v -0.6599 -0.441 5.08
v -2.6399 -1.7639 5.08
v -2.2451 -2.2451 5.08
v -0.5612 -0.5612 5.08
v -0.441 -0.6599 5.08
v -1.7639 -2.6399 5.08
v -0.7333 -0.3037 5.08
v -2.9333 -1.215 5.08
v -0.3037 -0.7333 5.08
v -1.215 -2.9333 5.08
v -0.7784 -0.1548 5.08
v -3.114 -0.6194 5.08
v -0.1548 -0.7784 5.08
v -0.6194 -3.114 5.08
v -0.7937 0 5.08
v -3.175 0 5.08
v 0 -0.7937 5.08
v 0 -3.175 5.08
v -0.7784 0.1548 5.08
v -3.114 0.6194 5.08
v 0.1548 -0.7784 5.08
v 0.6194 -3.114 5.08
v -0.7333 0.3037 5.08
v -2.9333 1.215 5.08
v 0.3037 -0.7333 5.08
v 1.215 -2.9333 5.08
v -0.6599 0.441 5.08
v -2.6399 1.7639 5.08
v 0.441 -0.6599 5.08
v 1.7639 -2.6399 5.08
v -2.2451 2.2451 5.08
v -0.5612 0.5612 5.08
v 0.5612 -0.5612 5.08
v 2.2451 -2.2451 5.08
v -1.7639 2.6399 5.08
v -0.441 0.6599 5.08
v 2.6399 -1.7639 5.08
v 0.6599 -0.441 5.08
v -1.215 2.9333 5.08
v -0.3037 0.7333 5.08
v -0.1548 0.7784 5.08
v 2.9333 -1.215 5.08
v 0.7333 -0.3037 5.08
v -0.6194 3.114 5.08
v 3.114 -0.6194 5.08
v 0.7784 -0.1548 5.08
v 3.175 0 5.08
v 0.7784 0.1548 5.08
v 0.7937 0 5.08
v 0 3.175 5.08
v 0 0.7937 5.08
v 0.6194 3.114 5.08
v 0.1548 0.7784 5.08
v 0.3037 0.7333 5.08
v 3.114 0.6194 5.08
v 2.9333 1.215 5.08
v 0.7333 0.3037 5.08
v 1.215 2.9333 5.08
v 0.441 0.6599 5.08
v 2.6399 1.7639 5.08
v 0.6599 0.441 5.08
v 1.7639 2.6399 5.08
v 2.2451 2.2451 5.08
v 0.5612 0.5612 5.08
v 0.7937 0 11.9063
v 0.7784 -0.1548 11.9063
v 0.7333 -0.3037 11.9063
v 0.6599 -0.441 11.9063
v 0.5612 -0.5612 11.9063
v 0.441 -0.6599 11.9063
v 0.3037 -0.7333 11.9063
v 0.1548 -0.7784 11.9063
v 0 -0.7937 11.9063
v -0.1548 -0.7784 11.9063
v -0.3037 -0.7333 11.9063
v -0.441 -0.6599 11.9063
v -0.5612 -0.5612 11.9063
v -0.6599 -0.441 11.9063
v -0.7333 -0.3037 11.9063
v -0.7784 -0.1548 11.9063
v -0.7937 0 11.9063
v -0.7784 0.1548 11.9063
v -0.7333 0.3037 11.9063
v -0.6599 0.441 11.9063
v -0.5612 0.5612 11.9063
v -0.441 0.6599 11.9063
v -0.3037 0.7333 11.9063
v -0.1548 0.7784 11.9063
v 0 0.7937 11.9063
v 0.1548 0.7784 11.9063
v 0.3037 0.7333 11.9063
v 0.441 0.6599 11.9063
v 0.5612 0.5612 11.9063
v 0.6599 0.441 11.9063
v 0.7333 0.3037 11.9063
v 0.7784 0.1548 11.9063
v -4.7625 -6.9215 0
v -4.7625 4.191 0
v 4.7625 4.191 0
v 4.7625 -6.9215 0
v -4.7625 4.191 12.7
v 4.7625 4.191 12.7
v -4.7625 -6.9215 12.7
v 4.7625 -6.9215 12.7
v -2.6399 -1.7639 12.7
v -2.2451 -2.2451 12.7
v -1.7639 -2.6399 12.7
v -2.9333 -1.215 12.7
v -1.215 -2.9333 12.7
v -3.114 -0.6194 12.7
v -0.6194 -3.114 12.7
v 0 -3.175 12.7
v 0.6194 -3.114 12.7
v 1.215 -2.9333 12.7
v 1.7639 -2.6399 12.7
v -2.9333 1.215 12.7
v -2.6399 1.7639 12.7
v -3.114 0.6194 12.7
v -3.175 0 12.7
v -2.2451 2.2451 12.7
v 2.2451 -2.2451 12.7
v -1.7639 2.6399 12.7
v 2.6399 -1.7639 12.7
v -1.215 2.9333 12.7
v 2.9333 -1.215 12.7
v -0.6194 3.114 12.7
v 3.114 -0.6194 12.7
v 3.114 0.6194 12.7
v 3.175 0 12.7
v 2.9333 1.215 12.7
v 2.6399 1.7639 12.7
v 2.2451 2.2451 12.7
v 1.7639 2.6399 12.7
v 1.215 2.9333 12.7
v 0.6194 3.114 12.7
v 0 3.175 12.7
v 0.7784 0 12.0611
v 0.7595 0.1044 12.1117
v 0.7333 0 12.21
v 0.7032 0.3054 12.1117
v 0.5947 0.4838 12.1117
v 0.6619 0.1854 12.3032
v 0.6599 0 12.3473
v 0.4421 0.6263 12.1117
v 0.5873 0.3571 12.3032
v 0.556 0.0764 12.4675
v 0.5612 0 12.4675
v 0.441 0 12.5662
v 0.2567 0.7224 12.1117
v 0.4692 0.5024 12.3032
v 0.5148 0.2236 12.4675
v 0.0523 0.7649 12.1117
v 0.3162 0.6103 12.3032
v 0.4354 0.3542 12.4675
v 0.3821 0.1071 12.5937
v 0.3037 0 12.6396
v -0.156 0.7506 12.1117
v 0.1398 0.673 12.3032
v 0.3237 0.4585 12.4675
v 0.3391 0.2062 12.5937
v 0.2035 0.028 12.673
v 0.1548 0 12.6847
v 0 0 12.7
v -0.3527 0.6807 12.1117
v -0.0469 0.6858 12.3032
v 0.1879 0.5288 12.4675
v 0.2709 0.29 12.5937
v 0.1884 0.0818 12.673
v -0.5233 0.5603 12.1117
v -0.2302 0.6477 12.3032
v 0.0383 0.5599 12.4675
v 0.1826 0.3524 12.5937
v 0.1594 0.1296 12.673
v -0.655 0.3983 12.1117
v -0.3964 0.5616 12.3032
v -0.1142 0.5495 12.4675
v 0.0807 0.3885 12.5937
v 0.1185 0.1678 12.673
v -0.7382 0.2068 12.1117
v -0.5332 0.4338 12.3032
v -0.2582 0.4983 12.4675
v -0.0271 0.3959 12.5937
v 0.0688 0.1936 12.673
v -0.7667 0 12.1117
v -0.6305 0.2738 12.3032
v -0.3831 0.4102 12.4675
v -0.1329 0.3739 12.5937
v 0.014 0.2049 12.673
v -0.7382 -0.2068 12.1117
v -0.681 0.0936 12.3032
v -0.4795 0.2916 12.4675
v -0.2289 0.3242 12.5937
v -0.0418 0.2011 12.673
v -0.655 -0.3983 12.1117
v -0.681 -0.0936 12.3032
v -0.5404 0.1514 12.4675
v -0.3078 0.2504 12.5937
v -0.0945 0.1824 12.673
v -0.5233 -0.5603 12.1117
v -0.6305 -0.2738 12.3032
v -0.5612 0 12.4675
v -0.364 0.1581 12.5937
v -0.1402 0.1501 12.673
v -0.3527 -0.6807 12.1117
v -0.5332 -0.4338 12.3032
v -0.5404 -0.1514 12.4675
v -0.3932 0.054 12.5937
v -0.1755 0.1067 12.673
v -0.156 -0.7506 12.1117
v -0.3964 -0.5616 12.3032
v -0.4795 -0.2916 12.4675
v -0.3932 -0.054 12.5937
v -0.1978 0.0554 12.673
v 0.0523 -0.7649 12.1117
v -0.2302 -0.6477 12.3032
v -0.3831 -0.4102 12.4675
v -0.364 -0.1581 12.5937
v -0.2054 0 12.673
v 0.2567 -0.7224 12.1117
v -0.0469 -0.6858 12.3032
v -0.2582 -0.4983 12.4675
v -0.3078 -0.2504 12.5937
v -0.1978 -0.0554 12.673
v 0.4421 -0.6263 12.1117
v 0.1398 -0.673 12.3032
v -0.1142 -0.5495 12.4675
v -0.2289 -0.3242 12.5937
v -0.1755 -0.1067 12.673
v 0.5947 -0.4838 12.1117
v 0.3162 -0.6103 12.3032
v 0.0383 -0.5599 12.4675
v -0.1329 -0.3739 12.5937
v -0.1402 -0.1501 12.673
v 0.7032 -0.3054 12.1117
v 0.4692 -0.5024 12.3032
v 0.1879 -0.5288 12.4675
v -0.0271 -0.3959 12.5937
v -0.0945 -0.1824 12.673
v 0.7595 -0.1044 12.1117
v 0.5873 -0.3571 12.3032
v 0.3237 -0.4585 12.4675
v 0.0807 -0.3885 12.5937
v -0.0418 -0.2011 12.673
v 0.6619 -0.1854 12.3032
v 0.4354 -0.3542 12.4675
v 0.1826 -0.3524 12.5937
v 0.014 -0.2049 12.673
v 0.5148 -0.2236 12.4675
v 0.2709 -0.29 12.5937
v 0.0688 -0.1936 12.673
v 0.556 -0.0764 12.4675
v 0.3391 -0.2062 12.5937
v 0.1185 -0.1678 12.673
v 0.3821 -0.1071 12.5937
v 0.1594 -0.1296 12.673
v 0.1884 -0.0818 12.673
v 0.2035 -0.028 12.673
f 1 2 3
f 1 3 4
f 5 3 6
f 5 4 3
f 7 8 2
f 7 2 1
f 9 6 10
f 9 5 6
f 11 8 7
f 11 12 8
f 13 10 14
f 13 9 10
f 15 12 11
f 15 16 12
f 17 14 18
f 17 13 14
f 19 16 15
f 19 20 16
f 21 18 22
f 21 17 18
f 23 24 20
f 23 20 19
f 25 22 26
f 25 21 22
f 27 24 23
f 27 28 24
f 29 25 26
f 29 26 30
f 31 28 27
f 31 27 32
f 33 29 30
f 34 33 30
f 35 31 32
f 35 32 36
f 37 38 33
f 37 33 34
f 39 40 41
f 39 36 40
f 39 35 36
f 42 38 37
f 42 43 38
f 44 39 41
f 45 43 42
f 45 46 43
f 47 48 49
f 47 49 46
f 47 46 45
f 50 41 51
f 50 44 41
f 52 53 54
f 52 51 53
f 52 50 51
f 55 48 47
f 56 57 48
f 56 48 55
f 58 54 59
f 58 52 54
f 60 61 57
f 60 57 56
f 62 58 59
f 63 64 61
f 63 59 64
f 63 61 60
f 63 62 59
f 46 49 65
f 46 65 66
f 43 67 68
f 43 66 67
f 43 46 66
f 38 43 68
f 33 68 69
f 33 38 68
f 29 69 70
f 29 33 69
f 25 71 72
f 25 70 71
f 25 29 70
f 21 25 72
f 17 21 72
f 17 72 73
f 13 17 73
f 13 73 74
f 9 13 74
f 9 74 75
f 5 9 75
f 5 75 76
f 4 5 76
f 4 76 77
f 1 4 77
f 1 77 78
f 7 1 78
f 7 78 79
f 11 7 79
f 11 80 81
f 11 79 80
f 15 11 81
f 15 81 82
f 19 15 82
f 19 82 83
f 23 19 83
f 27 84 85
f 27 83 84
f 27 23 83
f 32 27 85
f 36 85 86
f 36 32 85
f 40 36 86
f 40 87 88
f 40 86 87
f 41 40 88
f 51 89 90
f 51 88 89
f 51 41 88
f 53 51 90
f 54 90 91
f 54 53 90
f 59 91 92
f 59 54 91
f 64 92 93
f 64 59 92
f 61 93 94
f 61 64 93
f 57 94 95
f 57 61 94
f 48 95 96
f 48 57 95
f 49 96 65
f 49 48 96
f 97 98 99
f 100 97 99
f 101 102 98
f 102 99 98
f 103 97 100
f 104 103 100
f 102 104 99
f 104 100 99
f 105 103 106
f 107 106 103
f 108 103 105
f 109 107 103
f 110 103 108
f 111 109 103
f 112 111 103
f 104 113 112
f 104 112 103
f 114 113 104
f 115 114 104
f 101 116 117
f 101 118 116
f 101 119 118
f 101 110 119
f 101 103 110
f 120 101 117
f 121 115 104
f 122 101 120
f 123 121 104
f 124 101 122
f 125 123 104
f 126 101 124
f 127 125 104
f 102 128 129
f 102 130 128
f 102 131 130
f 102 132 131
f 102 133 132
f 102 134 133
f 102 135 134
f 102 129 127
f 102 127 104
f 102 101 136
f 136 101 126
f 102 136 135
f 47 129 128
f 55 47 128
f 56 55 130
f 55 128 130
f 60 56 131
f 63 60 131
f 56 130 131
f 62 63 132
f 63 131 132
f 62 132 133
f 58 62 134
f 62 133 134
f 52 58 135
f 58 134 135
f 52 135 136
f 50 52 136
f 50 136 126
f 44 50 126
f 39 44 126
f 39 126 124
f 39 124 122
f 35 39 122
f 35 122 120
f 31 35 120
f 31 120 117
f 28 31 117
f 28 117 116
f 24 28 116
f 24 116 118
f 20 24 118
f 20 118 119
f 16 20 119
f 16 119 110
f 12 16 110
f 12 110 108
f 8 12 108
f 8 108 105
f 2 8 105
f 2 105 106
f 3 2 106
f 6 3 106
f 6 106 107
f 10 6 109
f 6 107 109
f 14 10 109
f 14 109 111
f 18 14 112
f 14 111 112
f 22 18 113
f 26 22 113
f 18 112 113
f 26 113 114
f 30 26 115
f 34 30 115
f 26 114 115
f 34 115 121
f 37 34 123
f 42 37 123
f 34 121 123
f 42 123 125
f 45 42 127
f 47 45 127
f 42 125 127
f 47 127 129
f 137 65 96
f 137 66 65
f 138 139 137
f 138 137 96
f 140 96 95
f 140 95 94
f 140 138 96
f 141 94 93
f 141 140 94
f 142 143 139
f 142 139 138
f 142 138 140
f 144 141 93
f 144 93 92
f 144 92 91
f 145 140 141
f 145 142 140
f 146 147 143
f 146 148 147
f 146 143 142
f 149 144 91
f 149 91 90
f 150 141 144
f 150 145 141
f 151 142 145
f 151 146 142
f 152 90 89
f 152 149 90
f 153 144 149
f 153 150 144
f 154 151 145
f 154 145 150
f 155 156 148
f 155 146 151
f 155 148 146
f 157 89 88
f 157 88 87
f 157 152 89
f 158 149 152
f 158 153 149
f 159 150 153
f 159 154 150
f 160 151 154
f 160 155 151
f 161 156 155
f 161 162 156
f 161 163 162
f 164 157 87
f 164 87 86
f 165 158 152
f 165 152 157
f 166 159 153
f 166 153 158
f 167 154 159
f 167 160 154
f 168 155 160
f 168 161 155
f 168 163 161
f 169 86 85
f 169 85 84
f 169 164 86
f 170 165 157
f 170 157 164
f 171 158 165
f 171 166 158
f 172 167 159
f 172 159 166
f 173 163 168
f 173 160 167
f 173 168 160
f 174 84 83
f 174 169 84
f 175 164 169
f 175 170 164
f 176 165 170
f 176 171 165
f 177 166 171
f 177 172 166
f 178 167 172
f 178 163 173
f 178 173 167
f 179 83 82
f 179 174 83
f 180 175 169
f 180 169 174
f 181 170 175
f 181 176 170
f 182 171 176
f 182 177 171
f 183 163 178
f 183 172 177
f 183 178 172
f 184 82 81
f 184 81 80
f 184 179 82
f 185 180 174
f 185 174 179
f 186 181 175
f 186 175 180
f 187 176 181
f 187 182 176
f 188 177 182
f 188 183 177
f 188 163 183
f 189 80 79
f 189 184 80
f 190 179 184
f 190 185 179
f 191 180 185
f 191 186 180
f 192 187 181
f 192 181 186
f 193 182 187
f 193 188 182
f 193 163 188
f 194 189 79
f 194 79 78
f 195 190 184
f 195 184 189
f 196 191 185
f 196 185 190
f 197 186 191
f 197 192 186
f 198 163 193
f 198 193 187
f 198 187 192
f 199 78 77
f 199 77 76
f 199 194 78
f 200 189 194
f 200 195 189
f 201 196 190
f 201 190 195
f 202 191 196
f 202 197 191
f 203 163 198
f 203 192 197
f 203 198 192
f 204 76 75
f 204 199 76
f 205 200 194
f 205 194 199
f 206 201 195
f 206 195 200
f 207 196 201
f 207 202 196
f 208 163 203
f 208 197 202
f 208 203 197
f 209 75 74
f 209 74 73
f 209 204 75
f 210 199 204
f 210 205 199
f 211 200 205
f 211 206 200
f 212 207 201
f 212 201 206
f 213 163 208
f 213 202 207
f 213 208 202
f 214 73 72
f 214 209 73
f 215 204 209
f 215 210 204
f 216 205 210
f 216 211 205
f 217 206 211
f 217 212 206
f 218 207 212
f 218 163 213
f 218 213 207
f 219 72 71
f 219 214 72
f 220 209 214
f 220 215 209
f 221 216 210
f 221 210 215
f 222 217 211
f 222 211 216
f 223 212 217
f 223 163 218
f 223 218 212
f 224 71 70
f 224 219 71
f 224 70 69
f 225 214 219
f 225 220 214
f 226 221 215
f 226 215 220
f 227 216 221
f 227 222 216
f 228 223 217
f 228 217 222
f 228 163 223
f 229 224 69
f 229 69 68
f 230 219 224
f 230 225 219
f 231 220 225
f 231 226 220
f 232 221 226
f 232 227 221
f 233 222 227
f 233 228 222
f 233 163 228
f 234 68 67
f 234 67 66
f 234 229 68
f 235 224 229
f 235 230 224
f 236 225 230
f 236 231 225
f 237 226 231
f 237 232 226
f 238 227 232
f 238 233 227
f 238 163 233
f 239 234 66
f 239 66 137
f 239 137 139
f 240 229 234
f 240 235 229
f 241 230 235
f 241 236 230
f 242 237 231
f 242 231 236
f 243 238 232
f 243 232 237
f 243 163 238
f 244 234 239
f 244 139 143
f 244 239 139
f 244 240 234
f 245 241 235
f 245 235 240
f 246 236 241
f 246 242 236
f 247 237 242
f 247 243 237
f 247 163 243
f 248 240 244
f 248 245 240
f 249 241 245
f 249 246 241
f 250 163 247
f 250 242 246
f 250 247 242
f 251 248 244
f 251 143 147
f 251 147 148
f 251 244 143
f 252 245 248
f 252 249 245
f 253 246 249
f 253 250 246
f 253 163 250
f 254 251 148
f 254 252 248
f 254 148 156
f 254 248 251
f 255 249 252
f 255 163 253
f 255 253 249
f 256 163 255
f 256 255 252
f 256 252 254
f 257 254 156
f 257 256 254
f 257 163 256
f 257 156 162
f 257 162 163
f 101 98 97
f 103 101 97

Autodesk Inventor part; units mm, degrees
ref_plane "YZ Plane" through (0, 0, 0) normal (1, 0, 0) x (0, 1, 0)
ref_plane "XZ Plane" through (0, 0, 0) normal (0, 1, 0) x (-1, 0, 0)
ref_plane "XY Plane" through (0, 0, 0) normal (0, 0, 1) x (1, 0, 0)
sketch "Sketch1" plane through (0, 0, 0) normal (0, 0, 1) x (1, 0, 0)
  line L0 (-4.7625, -6.9215) -> (4.7625, -6.9215)
  line L1 (4.7625, -6.9215) -> (4.7625, 4.191)
  line L2 (4.7625, 4.191) -> (-4.7625, 4.191)
  line L3 (-4.7625, 4.191) -> (-4.7625, -6.9215)
  point P0 (0, 0)
  dimension "d0" = 9.525
  dimension "d1" = 11.1125
  dimension "d2" = 4.7625
  dimension "d3" = 4.191
extrude "Extrusion1" add sketch "Sketch1" along normal blind 12.7
sketch "Sketch2" plane through (0, 0, 12.7) normal (0, 0, 1) x (1, 0, 0)
  circle A0 centre (0, 0) radius 3.175
  dimension "d6" = 6.35
extrude "Extrusion2" cut sketch "Sketch2" against normal blind 7.62
sketch "Sketch3" plane through (0, 0, 5.08) normal (0, 0, 1) x (1, 0, 0)
  circle A0 centre (0, 0) radius 0.7937
  dimension "d9" = 1.5875
extrude "Extrusion3" add sketch "Sketch3" along normal blind 7.62
fillet "Fillet1" radius 0.7937 1 edges at (-0.7937, 0, 12.7)
equation "\"d2\" = 0.5 * d0"
properties part number "Plug"
